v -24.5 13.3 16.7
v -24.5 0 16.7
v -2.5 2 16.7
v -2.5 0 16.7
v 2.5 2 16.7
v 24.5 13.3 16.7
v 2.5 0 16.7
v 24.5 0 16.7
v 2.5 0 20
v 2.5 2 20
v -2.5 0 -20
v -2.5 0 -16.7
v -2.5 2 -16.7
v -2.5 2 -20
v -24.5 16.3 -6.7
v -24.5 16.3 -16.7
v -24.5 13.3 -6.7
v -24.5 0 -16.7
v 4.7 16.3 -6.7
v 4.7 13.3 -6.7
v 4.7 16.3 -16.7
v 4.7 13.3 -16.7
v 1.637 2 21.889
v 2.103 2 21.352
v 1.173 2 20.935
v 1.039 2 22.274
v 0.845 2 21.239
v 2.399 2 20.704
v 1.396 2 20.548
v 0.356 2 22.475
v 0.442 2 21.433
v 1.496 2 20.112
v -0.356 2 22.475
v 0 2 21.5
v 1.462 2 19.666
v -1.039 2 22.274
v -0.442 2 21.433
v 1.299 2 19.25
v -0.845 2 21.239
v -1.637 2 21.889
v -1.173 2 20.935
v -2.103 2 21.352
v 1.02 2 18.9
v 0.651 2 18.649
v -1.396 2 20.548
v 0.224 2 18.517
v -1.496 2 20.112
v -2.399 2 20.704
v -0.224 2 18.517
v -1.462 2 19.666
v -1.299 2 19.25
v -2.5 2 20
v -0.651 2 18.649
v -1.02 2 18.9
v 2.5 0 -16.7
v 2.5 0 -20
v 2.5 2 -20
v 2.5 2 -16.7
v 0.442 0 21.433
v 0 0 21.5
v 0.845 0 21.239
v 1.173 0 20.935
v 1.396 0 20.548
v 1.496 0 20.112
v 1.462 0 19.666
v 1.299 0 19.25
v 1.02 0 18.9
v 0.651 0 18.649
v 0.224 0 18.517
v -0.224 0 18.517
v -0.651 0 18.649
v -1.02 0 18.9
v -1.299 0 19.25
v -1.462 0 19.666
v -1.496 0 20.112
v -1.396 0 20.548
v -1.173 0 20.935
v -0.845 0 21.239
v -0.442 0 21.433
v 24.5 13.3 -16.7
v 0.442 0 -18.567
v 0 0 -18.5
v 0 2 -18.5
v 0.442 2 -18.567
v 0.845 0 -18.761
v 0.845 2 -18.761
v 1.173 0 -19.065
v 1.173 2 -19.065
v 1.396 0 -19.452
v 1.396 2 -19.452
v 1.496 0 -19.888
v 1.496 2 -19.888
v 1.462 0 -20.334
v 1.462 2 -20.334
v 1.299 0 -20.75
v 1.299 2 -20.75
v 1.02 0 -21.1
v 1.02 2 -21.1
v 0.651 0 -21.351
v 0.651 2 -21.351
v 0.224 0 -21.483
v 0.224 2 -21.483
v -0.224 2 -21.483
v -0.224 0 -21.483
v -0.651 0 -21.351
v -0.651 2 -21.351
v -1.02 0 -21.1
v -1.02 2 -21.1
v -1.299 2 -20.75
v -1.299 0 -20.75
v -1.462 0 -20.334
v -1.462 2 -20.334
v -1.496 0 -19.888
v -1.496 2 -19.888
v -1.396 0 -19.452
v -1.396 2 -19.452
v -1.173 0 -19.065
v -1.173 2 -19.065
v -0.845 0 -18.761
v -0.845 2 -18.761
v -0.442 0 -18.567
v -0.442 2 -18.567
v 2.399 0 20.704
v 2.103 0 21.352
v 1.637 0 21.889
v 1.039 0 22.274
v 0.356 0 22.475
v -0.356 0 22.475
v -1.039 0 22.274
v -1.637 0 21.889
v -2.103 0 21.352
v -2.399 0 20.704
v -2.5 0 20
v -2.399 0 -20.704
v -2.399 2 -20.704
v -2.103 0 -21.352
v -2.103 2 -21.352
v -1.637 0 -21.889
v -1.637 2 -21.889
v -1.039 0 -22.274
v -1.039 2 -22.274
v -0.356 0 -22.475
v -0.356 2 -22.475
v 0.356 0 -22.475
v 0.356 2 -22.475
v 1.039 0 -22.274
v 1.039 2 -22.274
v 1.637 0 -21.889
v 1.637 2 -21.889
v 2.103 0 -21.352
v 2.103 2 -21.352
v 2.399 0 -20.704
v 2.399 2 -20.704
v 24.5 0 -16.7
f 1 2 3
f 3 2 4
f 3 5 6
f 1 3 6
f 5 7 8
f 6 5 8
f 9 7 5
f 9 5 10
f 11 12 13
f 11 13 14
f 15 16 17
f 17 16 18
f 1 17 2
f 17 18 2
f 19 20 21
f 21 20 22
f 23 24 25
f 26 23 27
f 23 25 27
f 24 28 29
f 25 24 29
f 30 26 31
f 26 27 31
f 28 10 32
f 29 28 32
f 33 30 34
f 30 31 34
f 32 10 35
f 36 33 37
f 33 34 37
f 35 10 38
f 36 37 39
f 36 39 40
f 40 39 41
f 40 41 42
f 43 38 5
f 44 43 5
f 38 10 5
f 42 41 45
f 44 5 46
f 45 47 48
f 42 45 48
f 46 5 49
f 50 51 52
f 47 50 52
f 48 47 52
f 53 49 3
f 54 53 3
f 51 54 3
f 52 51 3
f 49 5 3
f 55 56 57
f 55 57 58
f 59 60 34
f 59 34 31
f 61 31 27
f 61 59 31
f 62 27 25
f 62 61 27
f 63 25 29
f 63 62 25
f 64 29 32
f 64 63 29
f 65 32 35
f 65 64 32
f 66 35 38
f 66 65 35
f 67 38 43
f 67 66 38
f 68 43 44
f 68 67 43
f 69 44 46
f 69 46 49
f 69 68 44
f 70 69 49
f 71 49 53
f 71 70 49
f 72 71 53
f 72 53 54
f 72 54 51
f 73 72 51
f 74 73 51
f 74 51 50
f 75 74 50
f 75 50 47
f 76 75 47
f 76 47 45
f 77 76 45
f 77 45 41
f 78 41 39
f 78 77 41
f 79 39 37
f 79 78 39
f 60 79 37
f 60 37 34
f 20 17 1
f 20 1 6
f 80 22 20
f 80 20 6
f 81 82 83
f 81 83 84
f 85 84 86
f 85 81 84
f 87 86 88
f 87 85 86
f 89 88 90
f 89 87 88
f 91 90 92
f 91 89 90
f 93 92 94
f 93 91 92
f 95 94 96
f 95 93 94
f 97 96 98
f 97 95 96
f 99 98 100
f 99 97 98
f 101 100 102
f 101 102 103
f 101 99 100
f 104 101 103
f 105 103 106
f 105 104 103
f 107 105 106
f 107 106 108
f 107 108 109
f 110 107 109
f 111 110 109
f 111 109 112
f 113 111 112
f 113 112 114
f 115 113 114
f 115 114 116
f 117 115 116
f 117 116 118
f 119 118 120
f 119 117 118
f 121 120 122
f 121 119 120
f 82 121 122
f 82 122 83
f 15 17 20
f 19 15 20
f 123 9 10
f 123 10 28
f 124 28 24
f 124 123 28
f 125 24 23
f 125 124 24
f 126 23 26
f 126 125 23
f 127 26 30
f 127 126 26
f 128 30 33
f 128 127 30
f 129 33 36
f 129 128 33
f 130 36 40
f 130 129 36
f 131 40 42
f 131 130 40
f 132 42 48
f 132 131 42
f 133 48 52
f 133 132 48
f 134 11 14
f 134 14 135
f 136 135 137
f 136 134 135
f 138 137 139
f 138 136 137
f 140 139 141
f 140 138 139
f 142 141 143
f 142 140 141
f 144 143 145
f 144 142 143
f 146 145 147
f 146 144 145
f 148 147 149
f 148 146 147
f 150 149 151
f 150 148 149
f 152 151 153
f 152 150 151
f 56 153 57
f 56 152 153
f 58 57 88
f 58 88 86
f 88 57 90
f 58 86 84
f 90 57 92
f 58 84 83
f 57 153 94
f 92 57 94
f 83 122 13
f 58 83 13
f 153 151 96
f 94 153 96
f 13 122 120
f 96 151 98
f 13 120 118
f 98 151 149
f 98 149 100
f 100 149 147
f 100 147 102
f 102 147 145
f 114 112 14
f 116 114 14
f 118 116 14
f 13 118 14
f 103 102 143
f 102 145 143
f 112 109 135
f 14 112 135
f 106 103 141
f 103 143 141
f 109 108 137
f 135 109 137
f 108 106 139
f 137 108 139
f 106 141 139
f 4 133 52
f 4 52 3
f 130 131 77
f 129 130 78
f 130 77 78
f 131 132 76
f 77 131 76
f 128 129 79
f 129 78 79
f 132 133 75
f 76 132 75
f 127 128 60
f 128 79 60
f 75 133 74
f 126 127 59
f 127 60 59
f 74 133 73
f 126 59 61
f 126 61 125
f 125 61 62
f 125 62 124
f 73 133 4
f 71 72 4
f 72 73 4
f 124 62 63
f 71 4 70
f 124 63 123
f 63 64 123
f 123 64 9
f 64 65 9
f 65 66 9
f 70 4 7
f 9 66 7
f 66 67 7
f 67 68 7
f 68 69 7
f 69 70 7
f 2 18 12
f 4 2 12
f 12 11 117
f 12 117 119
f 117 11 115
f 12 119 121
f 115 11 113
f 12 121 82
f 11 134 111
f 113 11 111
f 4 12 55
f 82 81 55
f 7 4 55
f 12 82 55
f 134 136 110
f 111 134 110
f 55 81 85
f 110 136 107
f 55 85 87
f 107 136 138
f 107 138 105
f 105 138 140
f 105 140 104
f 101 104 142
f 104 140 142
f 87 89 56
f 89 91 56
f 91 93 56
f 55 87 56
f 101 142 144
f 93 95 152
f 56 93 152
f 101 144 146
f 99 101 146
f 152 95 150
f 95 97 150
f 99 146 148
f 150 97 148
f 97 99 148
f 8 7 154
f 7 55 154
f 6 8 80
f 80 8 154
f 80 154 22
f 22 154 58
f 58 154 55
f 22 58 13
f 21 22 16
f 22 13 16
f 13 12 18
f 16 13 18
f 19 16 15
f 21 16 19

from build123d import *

# Parameters (mm, degrees)
BOSS_EXTRUDE1_DEPTH = 13.3
SKETCH1_3_R         = 1.5
BOSS_EXTRUDE2_DEPTH = 2
SKETCH2_W           = 29.2
SKETCH2_H           = 10
BOSS_EXTRUDE3_DEPTH = 16.3


with BuildPart() as part:
    # Sketch1 → Boss-Extrude1 (new body)
    with BuildSketch(Plane(origin=(0, 0, 0), x_dir=(1, 0, 0), z_dir=(0, 1, 0))):
        Polygon((-2.5, 16.7), (-24.5, 16.7), (-24.5, -16.7), (-2.5, -16.7), (2.5, -16.7), (24.5, -16.7), (24.5, 16.7), (2.5, 16.7), align=None)
    extrude(amount=BOSS_EXTRUDE1_DEPTH)

    # Sketch1<3> → Boss-Extrude2 (add)
    # profile 1 of 2: a face of its own
    with BuildSketch(Plane(origin=(0, 0, 0), x_dir=(1, 0, 0), z_dir=(0, 1, 0))):
        with BuildLine():
            Line((-2.5, 20), (-2.5, 16.7))
            Line((-2.5, 16.7), (2.5, 16.7))
            Line((2.5, 16.7), (2.5, 20))
            ThreePointArc((2.5, 20), (0, 22.5), (-2.5, 20))
        make_face()
        with Locations((0, 20)):
            Circle(SKETCH1_3_R, mode=Mode.SUBTRACT)
    # profile 2 of 2: a face of its own
    with BuildSketch(Plane(origin=(0, 0, 0), x_dir=(1, 0, 0), z_dir=(0, 1, 0))):
        with BuildLine():
            Line((2.5, -16.7), (-2.5, -16.7))
            Line((-2.5, -16.7), (-2.5, -20))
            ThreePointArc((-2.5, -20), (0, -22.5), (2.5, -20))
            Line((2.5, -20), (2.5, -16.7))
        make_face()
        with Locations((0, -20)):
            Circle(SKETCH1_3_R, mode=Mode.SUBTRACT)
    extrude(amount=BOSS_EXTRUDE2_DEPTH)

    # Sketch2 → Boss-Extrude3 (add)
    with BuildSketch(Plane(origin=(0, 0, 0), x_dir=(1, 0, 0), z_dir=(0, 1, 0))):
        with Locations((-9.9, 11.7)):
            Rectangle(SKETCH2_W, SKETCH2_H)
    extrude(amount=BOSS_EXTRUDE3_DEPTH)


solid = part.part
